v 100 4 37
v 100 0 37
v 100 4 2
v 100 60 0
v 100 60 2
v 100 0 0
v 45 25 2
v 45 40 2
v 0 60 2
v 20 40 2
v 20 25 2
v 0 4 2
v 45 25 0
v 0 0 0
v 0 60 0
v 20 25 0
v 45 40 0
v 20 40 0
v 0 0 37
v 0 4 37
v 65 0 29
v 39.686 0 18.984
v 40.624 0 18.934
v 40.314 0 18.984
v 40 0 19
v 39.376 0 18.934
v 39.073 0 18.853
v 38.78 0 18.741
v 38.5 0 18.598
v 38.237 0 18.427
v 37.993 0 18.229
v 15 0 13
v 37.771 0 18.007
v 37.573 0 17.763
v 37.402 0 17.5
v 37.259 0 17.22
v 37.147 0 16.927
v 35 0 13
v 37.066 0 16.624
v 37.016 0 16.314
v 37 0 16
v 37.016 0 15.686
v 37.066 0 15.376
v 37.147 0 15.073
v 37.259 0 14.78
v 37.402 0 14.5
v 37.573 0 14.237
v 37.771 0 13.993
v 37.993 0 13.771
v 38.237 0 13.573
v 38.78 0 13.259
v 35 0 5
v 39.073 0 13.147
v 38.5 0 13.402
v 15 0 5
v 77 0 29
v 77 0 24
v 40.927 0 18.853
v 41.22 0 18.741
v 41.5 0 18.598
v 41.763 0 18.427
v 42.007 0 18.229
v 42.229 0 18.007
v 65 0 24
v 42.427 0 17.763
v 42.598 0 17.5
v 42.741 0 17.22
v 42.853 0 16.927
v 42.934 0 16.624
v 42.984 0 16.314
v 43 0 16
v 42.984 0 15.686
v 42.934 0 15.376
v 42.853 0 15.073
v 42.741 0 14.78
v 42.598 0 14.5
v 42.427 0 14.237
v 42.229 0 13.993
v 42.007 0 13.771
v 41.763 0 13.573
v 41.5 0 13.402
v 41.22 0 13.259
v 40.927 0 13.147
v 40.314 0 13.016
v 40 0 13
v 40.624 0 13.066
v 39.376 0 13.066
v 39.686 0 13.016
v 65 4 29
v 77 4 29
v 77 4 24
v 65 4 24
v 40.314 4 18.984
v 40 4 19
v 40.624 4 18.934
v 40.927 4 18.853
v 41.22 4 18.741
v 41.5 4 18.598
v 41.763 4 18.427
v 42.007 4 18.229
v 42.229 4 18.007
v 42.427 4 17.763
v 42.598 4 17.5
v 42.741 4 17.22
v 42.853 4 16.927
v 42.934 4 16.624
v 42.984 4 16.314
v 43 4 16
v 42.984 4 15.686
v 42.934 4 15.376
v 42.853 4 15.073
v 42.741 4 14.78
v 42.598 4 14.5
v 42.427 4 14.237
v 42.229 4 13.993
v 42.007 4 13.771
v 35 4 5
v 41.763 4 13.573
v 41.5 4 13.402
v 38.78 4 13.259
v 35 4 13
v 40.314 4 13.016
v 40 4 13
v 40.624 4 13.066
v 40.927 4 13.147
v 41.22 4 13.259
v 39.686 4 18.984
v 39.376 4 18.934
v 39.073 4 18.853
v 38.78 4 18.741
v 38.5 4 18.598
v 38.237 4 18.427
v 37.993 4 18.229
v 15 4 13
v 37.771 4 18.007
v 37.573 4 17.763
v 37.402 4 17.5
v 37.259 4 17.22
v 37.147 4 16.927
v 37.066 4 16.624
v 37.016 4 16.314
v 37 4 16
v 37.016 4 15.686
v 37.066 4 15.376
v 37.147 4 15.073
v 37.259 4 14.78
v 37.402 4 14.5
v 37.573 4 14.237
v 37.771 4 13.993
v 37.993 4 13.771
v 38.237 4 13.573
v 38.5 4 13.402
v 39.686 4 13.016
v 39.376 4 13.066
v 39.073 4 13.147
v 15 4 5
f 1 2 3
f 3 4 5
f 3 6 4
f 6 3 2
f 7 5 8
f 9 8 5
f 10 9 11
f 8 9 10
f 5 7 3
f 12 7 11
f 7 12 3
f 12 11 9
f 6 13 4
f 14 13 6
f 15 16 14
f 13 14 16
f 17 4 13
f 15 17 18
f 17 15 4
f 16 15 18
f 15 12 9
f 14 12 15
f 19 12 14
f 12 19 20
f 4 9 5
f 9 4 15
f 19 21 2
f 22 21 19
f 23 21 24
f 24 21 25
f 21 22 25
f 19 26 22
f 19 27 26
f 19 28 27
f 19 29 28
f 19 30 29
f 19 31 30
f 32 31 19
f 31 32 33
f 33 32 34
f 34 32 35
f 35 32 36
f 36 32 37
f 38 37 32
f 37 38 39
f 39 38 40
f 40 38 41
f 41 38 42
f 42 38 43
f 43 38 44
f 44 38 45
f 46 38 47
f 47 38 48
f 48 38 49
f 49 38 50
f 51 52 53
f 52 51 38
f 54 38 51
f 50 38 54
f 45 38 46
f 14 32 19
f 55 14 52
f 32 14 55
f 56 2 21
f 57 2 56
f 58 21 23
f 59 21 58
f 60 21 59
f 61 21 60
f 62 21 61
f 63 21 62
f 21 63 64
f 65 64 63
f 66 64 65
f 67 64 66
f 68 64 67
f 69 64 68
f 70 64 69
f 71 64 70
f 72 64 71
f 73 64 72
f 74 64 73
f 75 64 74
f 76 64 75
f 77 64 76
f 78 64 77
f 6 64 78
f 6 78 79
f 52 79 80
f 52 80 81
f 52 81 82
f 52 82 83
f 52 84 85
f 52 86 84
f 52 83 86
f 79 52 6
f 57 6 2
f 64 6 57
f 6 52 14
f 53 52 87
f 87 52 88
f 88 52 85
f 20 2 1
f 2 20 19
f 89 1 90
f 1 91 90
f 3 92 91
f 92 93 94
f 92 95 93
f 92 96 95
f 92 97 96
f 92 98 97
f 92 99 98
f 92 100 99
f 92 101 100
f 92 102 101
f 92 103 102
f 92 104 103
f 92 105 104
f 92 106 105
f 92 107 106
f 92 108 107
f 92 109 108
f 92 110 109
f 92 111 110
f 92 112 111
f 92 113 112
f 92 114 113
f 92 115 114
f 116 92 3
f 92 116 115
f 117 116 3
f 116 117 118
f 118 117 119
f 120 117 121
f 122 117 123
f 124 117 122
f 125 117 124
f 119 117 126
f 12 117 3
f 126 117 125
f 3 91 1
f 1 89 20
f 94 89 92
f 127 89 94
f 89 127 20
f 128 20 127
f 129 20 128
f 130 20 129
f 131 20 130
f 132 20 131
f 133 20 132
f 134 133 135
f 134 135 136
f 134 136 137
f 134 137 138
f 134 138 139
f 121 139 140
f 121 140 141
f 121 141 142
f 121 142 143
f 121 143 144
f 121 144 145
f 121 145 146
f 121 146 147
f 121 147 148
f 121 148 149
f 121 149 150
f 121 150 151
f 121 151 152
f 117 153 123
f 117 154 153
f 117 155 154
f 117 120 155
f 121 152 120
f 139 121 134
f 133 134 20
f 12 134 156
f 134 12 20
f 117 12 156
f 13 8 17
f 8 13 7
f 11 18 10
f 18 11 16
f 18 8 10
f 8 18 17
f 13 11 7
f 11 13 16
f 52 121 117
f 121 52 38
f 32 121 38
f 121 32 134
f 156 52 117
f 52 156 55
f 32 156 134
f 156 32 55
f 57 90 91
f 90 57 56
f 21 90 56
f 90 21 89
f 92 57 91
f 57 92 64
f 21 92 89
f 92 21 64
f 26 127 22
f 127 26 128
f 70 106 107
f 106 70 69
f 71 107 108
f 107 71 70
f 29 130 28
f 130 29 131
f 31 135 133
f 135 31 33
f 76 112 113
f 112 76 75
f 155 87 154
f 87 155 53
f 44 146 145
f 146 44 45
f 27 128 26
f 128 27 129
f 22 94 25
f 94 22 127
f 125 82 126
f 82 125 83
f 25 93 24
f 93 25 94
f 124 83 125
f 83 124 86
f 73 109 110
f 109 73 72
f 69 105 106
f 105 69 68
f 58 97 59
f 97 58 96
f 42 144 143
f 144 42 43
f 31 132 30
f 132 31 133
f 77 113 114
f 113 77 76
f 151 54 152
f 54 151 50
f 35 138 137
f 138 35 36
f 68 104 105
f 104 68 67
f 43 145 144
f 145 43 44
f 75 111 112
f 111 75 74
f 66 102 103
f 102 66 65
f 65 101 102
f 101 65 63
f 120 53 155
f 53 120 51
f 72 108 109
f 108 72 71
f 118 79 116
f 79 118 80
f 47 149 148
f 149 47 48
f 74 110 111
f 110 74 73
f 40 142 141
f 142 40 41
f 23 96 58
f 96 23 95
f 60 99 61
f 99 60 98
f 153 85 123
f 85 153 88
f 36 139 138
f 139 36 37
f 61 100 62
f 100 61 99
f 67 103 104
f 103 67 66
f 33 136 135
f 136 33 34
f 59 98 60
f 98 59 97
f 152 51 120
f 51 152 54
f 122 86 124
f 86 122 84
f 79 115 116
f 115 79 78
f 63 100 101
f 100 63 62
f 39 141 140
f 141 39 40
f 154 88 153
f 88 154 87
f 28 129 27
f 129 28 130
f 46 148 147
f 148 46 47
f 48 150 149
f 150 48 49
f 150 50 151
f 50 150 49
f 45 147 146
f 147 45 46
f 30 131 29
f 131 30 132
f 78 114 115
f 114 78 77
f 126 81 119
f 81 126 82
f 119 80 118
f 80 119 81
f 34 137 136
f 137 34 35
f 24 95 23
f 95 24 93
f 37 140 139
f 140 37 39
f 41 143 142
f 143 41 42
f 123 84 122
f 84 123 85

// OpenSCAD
// ==========================================
// Parametric Sheet with Upright Wall and Cutouts
// ==========================================

// --- Resolution ---
$fn = 60;

// --- Base Sheet ---
base_width  = 100;  // X span
base_depth  = 60;   // Y span
base_thick  = 2;    // Very thin Z height

// --- Upright Wall ---
// Narrow strip rising from top face along the full back edge (y=0)
wall_height = 35;   // Z rise above base
wall_thick  = 4;    // Y thickness of wall strip

// --- Floor Plate Rectangular Cutout ---
// Through-cut in the thin sheet
floor_cut_w = 25;
floor_cut_d = 15;
floor_cut_x = 20;   // X position from left edge
floor_cut_y = 25;   // Y position from front (away from wall)

// --- Wall Openings (through wall thickness) ---
// Lower rectangular opening near bottom
wall_low_w   = 20;
wall_low_h   = 8;
wall_low_x   = 15;
wall_low_z   = 3;   // Height above base top face

// Higher smaller rectangular opening
wall_high_w  = 12;
wall_high_h  = 5;
wall_high_x  = 65;
wall_high_z  = 22;  // Height above base top face

// --- Round Through-Hole in Wall ---
hole_diam    = 6;
hole_x       = 40;
hole_z       = 14;  // Center height above base top face

// ==========================================
// Geometry
// ==========================================

difference() {
    // Solid body: base + wall
    union() {
        // Floor plate
        cube([base_width, base_depth, base_thick]);
        
        // Upright wall along back edge, full width
        translate([0, 0, base_thick])
            cube([base_width, wall_thick, wall_height]);
    }
    
    // --- Floor plate rectangular through-cut ---
    translate([floor_cut_x, floor_cut_y, -1])
        cube([floor_cut_w, floor_cut_d, base_thick + 2]);
    
    // --- Lower wall opening (through thickness) ---
    translate([wall_low_x, -1, base_thick + wall_low_z])
        cube([wall_low_w, wall_thick + 2, wall_low_h]);
    
    // --- Higher wall opening (through thickness) ---
    translate([wall_high_x, -1, base_thick + wall_high_z])
        cube([wall_high_w, wall_thick + 2, wall_high_h]);
    
    // --- Round through-hole in wall ---
    // Rotated cylinder aligned to wall thickness (Y axis)
    translate([hole_x, wall_thick / 2, base_thick + hole_z])
        rotate([90, 0, 0])
        cylinder(d = hole_diam, h = wall_thick + 2, center = true);
}
